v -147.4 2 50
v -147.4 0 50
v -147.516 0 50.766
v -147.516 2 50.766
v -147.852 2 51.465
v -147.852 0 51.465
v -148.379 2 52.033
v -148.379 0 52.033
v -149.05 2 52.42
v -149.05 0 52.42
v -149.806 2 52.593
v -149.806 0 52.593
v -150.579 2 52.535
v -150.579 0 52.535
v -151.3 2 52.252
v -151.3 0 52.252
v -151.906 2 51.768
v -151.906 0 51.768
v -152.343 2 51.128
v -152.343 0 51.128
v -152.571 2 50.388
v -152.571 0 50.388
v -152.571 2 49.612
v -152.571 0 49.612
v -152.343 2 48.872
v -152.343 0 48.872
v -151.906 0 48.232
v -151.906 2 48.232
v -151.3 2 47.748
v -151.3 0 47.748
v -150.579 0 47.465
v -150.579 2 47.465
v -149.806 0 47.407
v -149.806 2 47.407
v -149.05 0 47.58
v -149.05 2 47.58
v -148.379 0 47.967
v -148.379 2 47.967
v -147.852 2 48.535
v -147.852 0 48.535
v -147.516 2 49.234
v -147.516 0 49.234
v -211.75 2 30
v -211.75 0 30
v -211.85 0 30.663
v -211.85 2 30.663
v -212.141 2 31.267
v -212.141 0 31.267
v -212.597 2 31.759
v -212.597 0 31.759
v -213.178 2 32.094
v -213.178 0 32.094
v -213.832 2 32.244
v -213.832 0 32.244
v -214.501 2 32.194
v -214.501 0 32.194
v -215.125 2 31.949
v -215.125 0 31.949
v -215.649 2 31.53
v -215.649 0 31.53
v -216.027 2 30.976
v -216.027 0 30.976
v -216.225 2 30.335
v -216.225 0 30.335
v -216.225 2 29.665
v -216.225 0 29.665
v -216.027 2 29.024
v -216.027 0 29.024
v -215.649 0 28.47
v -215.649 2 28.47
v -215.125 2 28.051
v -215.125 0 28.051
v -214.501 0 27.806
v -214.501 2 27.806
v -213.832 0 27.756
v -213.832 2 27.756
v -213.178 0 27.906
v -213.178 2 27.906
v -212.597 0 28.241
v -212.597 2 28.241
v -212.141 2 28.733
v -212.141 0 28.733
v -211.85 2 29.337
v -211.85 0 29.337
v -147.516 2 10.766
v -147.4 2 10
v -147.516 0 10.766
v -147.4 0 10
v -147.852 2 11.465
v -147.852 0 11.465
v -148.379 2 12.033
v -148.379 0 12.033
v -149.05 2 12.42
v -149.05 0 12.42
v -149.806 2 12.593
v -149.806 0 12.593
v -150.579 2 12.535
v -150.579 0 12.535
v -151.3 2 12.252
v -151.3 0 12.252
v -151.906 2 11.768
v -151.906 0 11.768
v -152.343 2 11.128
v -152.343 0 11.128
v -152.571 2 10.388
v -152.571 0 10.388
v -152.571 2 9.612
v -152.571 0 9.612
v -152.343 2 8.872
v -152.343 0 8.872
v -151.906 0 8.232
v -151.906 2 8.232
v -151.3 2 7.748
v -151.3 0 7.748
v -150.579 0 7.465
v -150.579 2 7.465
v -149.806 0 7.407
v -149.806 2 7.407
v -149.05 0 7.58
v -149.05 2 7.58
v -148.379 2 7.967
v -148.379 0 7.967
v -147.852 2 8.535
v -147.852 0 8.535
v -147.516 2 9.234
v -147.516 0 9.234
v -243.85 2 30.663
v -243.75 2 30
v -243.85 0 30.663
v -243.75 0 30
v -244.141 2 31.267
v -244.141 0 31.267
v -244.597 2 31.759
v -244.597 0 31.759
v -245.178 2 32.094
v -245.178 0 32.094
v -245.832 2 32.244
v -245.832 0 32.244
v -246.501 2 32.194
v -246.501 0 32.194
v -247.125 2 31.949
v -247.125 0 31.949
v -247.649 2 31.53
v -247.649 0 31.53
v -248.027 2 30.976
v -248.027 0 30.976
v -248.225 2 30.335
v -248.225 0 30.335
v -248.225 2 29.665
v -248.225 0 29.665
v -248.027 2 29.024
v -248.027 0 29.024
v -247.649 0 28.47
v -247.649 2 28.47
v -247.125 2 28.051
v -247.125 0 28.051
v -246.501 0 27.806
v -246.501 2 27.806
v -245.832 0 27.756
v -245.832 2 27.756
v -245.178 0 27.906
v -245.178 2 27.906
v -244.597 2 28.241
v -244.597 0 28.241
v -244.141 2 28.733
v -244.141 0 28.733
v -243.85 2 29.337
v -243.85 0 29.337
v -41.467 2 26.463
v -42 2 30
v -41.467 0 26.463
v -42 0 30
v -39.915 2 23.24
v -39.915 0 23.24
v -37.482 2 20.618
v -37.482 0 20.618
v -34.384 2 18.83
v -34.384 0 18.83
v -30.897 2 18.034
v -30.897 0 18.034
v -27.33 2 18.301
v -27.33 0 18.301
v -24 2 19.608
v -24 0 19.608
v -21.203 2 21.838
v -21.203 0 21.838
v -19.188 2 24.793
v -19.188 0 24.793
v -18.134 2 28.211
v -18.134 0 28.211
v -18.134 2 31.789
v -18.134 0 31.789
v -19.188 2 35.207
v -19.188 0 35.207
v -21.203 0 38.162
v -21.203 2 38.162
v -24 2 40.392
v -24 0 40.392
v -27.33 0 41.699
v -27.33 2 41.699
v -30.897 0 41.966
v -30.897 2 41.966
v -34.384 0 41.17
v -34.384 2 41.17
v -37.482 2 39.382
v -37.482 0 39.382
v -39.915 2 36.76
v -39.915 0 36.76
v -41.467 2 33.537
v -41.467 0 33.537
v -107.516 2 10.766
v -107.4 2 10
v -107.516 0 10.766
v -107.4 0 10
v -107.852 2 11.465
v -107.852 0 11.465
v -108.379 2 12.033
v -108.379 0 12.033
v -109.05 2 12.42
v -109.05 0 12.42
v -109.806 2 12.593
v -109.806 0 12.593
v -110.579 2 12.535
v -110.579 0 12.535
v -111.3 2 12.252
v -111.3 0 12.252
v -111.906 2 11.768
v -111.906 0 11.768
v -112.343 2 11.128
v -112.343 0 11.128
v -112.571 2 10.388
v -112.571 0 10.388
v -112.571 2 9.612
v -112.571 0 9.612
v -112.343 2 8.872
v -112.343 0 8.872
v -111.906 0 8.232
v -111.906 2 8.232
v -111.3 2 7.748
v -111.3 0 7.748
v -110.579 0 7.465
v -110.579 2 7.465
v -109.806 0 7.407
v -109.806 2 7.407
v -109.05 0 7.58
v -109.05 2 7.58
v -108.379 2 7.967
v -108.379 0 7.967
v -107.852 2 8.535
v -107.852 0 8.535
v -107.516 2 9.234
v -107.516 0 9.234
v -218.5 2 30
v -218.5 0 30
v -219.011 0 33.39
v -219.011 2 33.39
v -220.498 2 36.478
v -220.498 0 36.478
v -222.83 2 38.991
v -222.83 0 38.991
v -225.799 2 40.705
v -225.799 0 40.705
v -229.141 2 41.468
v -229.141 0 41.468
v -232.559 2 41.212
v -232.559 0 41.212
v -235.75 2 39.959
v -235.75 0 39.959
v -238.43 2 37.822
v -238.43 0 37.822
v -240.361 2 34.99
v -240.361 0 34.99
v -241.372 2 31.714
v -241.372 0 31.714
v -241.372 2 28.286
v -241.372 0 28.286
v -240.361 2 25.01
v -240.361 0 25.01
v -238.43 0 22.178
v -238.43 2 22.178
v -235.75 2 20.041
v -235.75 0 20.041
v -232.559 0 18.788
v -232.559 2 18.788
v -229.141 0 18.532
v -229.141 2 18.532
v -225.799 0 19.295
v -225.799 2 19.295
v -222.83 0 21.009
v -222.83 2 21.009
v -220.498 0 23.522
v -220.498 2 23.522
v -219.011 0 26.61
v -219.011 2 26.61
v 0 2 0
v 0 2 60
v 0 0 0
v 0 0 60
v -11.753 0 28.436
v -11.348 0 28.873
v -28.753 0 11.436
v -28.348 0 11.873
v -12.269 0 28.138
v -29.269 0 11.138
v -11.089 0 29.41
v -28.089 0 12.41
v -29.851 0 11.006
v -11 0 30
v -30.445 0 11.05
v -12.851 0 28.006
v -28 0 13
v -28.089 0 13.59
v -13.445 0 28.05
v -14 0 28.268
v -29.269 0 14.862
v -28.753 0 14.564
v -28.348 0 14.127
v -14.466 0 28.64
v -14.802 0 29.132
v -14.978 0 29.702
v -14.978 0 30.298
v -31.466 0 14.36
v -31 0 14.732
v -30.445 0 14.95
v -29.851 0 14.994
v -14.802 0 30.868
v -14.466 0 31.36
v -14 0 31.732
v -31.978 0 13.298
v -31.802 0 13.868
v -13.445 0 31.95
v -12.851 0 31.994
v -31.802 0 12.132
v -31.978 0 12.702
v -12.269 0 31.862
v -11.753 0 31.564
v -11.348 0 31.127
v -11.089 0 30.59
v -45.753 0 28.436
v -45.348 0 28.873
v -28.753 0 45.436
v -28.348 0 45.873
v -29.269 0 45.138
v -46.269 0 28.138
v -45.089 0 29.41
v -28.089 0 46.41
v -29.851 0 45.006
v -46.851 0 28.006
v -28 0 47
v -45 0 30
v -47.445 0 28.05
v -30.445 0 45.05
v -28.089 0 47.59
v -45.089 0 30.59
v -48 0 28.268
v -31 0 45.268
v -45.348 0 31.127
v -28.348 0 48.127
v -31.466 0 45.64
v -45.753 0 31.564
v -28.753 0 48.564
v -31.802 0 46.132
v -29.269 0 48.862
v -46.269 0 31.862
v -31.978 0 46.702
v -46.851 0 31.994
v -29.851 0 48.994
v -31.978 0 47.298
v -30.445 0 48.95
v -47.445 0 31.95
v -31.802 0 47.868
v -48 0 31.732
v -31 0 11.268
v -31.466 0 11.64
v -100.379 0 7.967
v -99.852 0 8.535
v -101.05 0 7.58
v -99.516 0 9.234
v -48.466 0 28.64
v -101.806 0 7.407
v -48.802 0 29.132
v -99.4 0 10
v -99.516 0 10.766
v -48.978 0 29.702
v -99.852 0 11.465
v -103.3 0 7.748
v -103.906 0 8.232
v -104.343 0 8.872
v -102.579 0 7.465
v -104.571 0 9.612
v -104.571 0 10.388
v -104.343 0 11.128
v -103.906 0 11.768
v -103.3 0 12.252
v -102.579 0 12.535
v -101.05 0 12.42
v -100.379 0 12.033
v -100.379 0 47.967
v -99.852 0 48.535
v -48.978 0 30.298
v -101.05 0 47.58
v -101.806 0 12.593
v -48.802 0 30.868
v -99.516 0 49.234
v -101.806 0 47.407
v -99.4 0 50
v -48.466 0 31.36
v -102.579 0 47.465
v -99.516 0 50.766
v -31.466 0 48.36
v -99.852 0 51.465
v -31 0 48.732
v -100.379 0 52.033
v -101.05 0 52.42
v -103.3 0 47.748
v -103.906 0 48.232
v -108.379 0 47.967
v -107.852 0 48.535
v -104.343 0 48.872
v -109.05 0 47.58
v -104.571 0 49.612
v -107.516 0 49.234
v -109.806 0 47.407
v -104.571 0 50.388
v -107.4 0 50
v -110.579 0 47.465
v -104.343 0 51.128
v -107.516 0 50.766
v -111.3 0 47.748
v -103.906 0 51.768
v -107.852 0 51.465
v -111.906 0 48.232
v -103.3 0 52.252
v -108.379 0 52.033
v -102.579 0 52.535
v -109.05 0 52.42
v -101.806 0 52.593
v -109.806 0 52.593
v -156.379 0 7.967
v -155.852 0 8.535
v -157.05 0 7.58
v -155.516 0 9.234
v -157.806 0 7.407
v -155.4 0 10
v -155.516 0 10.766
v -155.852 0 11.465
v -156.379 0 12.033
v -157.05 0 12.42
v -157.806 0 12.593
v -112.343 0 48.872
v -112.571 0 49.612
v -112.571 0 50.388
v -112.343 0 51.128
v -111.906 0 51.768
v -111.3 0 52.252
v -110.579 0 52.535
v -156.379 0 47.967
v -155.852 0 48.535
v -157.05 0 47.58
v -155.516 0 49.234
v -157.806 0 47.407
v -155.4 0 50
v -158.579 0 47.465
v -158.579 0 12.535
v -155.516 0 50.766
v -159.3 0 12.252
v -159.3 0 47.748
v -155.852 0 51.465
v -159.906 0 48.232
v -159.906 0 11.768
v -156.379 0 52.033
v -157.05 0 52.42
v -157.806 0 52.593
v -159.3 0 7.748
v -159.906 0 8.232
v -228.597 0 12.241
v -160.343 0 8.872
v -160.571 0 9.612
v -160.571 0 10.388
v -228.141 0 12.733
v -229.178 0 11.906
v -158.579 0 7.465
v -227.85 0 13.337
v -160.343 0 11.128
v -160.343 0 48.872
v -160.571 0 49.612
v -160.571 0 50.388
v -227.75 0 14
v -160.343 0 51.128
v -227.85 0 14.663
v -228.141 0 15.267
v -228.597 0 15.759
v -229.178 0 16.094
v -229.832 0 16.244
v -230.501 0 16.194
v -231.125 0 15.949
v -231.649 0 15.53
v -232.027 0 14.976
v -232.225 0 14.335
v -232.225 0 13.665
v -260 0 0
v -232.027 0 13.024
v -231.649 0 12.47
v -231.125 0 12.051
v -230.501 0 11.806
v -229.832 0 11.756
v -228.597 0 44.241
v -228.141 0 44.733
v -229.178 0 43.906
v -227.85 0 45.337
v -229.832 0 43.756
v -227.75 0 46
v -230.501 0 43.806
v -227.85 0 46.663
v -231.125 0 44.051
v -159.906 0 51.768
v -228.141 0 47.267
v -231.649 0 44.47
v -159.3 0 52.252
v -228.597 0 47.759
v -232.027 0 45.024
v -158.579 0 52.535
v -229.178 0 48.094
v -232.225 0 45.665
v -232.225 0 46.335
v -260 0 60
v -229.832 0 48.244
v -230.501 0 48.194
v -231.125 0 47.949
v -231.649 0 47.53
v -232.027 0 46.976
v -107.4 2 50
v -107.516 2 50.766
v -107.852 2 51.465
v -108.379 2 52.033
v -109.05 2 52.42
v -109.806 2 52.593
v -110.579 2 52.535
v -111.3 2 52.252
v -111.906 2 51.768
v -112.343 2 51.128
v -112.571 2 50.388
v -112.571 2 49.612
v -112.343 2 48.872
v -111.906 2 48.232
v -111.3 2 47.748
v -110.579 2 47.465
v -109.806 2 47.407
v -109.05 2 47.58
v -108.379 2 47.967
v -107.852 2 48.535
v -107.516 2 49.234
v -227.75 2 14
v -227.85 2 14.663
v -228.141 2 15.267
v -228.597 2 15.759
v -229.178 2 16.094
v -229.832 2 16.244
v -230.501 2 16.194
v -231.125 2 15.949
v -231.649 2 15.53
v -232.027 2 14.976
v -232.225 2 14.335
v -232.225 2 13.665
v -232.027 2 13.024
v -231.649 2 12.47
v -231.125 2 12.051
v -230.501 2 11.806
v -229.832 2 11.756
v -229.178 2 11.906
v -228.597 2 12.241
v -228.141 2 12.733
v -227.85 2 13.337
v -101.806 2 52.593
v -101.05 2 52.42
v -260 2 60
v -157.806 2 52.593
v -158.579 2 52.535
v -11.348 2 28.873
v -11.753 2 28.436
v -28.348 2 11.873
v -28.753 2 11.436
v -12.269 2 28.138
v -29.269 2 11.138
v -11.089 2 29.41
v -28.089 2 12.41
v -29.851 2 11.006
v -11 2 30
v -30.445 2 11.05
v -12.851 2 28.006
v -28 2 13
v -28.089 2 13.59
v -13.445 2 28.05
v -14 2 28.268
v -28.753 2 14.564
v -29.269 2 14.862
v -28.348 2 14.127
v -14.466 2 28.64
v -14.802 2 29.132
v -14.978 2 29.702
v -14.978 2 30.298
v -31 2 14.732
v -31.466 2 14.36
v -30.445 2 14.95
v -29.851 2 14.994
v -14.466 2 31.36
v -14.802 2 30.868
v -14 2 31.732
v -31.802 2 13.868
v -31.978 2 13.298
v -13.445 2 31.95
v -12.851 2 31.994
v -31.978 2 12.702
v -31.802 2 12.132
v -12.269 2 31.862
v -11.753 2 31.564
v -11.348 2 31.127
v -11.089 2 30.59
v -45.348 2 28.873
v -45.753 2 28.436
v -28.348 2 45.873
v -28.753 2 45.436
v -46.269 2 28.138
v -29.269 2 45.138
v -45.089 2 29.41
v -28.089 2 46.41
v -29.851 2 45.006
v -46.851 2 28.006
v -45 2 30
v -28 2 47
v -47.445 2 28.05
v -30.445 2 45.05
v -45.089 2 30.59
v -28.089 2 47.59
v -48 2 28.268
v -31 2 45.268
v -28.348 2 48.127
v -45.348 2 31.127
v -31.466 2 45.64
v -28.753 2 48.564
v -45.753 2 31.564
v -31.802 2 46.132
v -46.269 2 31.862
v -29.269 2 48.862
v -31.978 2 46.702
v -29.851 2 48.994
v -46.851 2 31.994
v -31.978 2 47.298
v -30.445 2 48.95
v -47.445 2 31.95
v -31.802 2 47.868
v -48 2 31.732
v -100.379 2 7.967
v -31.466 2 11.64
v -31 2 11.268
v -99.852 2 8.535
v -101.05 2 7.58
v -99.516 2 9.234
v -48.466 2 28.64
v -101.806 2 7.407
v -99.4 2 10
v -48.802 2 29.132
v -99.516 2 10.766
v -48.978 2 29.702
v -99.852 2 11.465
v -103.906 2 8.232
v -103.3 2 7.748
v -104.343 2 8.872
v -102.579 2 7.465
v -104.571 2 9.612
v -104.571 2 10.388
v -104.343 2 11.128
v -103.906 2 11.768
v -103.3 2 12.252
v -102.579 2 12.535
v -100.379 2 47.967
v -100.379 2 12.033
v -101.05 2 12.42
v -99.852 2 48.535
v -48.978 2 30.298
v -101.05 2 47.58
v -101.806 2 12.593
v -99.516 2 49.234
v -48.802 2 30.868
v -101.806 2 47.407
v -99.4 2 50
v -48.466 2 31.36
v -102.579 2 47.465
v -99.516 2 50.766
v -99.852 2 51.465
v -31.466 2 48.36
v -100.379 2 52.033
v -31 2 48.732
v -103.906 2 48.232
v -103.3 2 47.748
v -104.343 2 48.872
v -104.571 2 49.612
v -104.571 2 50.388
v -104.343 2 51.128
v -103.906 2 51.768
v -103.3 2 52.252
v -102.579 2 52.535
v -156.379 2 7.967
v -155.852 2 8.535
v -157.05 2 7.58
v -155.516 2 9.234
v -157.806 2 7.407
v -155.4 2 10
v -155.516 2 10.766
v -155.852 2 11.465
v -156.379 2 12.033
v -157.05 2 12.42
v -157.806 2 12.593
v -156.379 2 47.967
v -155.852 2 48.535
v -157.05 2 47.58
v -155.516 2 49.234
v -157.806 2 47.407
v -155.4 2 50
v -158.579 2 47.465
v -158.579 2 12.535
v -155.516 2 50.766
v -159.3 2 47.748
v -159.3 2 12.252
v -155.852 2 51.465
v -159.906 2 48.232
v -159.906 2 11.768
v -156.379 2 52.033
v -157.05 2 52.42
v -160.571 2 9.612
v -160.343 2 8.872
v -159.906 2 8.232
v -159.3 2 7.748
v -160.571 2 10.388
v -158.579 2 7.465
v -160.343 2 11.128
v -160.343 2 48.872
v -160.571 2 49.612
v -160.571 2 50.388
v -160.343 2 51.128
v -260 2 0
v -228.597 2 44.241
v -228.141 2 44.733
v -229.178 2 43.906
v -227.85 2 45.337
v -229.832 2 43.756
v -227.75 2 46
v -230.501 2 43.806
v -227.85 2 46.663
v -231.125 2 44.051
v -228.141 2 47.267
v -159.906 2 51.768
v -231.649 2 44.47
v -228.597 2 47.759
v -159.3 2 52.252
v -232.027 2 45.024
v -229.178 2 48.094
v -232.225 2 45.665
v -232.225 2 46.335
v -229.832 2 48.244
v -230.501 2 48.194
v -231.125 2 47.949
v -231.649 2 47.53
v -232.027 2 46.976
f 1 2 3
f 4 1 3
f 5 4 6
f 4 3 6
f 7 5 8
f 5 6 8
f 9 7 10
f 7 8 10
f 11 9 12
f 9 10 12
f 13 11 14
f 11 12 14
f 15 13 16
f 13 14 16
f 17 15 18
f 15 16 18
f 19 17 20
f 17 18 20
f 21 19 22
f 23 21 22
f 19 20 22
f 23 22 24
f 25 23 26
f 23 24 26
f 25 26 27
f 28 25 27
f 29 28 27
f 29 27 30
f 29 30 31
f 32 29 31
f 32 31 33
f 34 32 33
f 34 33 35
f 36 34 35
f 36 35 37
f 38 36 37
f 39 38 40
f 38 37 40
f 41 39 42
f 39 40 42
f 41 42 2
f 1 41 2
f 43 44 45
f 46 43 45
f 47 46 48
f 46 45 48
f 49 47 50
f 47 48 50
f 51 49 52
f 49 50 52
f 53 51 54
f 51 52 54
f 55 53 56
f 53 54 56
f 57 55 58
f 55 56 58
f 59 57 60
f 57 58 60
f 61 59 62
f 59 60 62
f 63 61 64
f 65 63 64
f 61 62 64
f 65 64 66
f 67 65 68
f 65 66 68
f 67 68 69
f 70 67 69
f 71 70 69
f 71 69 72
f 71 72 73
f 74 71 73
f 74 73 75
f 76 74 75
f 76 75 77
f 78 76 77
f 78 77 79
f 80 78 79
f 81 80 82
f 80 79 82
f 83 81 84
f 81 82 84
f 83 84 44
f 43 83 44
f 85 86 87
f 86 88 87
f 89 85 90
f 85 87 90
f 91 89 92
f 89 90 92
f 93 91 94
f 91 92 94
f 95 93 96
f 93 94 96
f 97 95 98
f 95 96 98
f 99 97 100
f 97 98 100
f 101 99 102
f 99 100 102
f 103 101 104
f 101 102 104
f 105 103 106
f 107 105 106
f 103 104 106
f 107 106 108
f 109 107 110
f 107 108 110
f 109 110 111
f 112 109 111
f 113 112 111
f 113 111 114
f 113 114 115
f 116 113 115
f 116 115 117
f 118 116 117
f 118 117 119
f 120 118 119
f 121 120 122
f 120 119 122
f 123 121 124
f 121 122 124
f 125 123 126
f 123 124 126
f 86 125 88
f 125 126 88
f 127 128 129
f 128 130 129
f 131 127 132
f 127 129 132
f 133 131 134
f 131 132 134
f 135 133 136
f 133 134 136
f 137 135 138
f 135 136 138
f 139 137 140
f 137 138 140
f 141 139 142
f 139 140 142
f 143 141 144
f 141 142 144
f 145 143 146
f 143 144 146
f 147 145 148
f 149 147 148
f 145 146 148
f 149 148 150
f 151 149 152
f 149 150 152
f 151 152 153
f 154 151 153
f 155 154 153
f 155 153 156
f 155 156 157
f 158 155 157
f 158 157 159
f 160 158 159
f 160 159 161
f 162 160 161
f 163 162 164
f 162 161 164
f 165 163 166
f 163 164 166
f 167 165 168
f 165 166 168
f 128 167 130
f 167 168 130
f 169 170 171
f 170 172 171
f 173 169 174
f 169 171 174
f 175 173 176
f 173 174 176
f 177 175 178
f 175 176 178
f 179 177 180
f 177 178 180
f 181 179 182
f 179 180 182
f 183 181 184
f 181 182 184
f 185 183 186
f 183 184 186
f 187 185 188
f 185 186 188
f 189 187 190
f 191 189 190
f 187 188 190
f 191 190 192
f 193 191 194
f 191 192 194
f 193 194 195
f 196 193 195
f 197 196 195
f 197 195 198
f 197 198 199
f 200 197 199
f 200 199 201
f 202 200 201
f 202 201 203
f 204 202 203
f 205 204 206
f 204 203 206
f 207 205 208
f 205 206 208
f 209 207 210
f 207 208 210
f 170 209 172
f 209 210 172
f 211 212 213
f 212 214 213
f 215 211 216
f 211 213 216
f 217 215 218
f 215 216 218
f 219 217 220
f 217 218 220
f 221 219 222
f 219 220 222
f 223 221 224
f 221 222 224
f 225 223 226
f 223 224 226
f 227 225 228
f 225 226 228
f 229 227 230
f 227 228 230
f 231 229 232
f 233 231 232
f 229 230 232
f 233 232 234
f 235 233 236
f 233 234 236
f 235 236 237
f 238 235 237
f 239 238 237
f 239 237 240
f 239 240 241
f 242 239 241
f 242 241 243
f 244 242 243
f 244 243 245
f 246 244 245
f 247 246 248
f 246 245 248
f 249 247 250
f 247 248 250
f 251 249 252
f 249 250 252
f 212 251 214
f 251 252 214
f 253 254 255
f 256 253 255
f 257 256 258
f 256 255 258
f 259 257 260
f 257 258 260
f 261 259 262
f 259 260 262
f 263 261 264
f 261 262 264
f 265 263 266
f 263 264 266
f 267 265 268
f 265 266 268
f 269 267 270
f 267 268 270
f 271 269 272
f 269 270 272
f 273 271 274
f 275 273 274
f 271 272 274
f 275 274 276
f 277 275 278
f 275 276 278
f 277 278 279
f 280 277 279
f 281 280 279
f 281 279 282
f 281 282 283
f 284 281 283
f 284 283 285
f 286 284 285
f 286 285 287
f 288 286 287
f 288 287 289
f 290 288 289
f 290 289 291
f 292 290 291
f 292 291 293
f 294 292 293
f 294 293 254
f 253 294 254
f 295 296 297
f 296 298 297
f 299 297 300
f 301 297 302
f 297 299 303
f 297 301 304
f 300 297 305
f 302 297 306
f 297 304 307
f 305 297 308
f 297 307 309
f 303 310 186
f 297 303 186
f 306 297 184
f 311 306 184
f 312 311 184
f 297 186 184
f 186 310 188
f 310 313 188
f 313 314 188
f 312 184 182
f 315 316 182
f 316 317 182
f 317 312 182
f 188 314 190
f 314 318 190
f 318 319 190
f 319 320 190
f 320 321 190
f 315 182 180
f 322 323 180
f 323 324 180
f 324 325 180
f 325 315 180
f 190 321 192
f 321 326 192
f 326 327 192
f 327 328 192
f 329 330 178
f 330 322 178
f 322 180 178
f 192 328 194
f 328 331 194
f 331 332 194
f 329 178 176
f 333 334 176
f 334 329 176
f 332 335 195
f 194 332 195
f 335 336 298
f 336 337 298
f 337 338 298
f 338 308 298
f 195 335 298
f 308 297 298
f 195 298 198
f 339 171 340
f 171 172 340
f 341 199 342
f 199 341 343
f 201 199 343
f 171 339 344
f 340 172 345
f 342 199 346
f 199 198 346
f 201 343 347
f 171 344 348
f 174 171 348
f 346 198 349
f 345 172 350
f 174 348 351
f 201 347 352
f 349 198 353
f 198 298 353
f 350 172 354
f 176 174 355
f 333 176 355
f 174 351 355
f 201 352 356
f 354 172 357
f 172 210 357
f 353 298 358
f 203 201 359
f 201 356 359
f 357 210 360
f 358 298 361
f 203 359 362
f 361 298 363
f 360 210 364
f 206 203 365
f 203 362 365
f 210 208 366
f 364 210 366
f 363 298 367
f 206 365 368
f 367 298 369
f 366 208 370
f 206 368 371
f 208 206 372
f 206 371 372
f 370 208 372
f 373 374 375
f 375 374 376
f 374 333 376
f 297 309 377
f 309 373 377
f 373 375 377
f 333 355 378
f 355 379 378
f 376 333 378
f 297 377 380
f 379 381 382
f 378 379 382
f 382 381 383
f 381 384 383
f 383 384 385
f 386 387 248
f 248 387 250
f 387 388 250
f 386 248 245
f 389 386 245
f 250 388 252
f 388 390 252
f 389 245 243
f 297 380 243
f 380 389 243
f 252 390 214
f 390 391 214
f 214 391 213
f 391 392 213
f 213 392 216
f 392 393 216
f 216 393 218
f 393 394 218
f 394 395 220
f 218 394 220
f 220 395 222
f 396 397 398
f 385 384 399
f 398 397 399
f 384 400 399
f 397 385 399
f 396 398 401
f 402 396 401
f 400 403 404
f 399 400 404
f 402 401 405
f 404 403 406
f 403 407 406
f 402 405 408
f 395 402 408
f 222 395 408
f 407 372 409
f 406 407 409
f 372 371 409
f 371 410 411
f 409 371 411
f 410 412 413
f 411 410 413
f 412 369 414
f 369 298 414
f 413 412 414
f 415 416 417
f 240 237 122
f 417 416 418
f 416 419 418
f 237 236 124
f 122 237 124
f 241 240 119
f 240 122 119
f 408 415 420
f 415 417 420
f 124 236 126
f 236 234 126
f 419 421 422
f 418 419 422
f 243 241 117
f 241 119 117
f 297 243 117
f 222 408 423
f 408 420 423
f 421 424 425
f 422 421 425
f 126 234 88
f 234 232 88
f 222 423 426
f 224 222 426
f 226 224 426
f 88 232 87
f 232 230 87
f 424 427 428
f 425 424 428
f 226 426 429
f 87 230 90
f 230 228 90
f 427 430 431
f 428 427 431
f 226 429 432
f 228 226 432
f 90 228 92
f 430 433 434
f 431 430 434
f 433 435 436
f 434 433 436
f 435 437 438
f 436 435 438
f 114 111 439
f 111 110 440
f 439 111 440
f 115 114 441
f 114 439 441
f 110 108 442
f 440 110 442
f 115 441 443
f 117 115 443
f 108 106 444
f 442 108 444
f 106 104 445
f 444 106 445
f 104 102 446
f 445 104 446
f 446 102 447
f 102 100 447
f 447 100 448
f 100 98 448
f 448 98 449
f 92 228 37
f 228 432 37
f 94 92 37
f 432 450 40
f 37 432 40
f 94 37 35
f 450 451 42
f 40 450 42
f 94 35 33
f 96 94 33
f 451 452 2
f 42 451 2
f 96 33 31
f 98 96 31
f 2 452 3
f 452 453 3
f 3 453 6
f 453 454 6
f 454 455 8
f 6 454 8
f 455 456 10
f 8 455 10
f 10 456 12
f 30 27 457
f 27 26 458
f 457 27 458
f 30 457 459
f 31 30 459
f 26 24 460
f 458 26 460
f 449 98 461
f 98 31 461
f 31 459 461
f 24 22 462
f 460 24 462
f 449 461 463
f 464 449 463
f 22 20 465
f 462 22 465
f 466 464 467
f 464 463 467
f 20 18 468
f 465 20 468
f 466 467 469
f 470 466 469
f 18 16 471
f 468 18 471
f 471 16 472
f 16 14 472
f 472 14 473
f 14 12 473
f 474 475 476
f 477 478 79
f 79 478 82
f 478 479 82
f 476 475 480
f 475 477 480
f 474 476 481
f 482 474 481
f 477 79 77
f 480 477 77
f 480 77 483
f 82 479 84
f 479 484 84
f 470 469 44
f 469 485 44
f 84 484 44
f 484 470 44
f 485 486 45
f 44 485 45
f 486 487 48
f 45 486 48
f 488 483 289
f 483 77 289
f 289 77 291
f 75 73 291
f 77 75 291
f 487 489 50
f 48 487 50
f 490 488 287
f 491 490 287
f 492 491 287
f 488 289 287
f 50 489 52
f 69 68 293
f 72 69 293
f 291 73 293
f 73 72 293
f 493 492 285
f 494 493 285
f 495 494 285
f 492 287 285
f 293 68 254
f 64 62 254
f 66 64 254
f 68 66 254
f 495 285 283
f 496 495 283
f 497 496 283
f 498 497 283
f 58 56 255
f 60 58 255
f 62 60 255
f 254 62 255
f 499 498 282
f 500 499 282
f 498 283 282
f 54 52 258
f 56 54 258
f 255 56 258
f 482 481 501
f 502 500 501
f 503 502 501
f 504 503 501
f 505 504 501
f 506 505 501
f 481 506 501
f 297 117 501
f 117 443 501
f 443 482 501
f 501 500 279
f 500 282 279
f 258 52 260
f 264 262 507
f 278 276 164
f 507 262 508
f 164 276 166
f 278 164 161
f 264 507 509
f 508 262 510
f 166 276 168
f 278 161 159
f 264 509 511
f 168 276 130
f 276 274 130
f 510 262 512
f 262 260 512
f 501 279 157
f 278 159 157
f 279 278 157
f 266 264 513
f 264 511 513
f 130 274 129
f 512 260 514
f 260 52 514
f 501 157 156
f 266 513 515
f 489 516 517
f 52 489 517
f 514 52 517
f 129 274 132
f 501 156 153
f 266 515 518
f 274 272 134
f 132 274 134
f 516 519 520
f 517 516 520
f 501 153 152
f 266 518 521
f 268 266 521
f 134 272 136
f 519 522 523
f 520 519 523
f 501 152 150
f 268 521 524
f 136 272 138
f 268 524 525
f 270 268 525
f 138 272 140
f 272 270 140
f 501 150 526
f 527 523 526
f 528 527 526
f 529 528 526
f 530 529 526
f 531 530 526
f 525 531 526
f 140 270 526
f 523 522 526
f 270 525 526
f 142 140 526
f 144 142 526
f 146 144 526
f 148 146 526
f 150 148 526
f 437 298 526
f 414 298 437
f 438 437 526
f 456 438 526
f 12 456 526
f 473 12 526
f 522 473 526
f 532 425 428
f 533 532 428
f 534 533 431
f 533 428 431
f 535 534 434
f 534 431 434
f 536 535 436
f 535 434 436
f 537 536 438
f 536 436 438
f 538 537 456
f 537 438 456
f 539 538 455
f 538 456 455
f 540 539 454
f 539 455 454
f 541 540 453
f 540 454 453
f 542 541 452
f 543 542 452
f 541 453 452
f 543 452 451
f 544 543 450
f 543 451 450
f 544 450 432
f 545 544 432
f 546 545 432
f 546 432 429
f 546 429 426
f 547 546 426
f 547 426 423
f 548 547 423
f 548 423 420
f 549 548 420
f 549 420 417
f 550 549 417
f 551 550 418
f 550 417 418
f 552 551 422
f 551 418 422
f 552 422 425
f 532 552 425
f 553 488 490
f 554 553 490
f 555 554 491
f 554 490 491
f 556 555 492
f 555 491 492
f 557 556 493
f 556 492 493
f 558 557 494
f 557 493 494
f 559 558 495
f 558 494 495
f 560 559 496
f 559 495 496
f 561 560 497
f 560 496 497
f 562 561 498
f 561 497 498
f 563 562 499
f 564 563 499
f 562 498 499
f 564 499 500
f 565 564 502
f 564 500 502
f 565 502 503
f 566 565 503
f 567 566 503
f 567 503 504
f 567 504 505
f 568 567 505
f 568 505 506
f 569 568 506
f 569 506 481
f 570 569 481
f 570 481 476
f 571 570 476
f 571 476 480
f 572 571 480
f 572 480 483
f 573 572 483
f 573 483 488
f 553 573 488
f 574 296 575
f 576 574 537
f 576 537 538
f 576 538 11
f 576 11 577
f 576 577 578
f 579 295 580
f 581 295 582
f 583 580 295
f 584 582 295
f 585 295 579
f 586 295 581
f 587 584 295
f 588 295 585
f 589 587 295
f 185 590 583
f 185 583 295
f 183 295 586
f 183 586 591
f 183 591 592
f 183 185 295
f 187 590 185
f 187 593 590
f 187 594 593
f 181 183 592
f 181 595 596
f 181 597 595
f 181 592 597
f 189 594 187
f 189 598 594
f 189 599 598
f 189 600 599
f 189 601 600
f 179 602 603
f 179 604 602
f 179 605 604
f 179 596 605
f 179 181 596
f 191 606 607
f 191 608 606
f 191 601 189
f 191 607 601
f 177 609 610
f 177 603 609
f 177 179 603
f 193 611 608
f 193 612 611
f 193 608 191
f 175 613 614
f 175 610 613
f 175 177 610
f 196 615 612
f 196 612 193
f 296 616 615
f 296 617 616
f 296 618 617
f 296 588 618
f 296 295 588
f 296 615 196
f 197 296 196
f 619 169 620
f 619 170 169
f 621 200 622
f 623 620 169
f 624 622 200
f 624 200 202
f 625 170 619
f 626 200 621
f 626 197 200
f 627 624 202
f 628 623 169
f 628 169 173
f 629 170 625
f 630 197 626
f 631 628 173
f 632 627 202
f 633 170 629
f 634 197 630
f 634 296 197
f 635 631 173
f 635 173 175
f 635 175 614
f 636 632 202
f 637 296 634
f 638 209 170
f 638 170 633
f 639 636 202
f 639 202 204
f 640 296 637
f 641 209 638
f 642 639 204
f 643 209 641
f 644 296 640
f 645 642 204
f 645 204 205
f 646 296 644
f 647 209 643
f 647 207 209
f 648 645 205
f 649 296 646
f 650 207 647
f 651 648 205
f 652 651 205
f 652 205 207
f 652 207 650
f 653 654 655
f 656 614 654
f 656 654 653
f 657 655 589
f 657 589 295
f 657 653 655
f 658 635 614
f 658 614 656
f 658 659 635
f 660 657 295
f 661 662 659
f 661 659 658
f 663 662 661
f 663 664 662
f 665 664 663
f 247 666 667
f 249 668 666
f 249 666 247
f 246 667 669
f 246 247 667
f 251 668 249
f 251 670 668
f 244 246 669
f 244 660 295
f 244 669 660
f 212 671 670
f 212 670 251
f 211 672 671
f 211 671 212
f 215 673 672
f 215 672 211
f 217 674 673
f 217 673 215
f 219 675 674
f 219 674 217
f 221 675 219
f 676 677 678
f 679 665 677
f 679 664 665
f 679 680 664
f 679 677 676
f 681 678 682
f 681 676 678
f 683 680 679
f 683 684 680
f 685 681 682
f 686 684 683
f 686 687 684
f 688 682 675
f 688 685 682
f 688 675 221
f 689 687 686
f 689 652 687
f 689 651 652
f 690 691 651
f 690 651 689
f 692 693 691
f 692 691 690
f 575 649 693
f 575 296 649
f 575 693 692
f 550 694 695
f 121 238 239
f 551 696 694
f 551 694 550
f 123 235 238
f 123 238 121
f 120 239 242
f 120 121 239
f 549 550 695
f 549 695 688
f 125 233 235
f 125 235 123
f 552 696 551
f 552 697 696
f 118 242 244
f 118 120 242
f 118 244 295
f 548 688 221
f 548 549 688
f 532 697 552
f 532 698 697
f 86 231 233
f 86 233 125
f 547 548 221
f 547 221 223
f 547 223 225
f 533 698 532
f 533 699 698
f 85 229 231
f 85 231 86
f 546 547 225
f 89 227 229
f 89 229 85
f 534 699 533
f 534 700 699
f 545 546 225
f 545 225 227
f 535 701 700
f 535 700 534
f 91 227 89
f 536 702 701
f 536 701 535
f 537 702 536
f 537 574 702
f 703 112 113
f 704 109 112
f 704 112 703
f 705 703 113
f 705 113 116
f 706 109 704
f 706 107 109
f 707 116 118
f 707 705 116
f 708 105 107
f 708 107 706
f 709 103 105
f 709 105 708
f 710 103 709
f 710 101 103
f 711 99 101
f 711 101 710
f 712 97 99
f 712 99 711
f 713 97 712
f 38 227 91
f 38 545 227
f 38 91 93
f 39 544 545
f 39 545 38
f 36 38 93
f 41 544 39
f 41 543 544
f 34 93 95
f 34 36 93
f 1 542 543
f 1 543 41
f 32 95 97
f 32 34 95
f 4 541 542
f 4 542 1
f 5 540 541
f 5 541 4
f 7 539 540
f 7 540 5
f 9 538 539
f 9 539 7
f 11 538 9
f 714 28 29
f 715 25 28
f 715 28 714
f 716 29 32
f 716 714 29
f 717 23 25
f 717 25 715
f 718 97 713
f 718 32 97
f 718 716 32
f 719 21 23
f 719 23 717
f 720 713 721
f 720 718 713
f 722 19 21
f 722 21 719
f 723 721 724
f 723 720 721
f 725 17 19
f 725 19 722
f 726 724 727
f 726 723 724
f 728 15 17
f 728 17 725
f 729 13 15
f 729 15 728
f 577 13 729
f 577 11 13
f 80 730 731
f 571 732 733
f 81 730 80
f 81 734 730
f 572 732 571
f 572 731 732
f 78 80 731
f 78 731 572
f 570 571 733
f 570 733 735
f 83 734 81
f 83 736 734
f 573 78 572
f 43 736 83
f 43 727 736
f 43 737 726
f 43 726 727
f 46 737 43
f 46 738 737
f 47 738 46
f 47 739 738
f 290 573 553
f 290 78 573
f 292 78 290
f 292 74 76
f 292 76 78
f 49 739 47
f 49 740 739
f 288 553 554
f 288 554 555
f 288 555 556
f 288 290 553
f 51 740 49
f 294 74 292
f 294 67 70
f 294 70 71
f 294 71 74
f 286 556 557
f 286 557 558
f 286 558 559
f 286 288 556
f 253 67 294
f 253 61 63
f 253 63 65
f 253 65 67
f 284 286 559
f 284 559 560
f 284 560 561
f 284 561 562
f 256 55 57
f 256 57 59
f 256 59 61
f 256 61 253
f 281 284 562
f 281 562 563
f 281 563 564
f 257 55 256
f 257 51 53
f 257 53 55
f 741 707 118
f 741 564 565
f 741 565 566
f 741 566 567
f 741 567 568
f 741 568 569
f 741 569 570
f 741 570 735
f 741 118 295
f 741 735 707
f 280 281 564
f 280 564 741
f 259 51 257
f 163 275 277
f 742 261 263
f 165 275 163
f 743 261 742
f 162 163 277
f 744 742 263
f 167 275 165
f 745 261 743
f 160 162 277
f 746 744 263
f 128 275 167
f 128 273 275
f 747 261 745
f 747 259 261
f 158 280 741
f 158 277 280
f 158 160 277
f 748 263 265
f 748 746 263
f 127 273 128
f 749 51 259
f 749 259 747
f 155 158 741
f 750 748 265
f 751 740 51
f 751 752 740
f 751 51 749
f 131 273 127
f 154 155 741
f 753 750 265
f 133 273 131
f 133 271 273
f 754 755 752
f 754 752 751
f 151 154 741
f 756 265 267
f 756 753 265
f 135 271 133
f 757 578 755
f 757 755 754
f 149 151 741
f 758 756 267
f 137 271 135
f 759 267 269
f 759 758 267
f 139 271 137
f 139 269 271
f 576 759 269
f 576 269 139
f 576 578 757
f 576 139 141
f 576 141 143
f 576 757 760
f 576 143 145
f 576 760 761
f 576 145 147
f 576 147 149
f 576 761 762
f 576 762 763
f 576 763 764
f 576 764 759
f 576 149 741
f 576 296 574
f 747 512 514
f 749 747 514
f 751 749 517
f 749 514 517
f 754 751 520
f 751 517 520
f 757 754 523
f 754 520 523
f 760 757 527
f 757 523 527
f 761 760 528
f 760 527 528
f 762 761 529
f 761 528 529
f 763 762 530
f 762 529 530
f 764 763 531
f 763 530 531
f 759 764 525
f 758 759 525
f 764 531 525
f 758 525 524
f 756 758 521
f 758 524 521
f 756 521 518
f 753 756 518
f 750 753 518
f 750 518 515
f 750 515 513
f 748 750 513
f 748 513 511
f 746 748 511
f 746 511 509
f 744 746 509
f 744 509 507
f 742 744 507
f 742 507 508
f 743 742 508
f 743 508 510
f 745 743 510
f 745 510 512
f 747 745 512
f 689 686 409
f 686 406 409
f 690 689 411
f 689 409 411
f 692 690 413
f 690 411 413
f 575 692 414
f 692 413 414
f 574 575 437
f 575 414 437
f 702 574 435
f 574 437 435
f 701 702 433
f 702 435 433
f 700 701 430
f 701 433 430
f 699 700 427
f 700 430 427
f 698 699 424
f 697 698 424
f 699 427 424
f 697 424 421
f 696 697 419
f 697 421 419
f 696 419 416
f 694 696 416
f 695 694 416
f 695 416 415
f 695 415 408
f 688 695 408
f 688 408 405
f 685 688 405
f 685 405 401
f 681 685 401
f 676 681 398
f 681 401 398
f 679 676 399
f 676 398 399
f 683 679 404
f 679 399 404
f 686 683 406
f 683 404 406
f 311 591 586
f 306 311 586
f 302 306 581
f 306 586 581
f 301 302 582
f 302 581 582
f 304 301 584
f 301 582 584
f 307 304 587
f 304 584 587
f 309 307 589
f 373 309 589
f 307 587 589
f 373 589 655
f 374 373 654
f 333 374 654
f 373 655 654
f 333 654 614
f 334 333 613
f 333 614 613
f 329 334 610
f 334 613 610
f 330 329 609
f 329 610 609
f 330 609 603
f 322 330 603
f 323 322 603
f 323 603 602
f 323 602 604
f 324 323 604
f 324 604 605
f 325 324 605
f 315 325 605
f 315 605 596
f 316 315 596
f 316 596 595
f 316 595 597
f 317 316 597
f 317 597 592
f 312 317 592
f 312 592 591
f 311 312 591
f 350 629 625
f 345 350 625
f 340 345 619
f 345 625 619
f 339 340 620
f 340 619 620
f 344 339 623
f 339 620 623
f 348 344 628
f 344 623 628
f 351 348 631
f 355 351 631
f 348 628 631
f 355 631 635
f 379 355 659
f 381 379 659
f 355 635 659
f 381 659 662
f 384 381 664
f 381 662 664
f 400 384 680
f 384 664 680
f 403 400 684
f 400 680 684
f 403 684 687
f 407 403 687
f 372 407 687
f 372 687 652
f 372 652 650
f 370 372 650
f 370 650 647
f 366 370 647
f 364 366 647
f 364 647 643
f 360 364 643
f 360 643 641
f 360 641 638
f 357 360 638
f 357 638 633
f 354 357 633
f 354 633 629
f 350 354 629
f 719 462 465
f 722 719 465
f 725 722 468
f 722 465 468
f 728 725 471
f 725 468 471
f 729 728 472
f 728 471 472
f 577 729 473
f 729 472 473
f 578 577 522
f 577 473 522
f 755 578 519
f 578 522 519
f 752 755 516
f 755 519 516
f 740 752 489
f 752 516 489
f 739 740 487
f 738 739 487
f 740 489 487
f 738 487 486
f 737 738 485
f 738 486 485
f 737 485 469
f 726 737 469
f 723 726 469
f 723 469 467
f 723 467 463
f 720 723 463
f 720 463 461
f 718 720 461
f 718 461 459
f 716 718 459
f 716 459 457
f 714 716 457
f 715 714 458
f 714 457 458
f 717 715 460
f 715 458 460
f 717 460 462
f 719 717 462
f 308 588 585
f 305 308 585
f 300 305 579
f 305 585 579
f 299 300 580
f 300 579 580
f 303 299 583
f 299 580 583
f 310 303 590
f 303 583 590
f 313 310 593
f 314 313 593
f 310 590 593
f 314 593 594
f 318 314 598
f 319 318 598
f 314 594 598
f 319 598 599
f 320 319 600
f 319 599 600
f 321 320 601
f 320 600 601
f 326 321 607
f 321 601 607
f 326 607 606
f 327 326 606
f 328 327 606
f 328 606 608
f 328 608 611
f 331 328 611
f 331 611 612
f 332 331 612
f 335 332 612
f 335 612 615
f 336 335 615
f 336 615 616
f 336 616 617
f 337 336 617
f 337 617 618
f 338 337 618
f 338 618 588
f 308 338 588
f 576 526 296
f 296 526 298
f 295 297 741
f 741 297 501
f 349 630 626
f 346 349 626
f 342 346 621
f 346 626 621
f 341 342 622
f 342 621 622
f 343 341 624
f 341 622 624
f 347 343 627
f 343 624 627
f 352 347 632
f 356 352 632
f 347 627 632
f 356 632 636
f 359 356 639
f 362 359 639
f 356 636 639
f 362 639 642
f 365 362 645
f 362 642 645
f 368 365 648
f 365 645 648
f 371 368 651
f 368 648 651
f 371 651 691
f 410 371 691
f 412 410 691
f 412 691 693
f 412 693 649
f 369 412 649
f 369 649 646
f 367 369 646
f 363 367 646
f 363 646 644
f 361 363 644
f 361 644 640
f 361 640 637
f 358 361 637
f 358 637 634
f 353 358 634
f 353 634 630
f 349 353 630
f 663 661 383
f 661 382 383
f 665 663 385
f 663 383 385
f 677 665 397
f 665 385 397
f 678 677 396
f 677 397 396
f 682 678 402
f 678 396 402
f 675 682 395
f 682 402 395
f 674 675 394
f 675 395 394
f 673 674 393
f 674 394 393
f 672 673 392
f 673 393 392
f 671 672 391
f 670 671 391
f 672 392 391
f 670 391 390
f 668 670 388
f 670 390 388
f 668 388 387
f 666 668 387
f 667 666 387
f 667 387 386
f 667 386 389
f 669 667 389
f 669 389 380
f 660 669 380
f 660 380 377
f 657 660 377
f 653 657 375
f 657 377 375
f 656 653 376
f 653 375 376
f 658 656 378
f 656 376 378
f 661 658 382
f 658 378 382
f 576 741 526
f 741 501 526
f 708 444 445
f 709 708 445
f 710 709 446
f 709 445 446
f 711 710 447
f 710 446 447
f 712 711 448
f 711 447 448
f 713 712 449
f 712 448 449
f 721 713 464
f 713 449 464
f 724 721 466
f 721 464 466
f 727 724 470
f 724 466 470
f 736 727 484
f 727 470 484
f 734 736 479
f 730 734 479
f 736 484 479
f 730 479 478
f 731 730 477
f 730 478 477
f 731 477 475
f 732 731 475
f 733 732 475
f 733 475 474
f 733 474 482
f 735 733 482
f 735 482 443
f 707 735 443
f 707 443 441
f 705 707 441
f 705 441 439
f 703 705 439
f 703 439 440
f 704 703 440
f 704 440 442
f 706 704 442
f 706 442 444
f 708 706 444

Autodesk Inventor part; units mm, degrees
ref_plane "YZ Plane" through (0, 0, 0) normal (1, 0, 0) x (0, 1, 0)
ref_plane "XZ Plane" through (0, 0, 0) normal (0, 1, 0) x (-1, 0, 0)
ref_plane "XY Plane" through (0, 0, 0) normal (0, 0, 1) x (1, 0, 0)
sketch "スケッチ1" plane through (0, 0, 0) normal (0, 1, 0) x (-1, 0, 0)
  line L0 (0, 0) -> (260, 0)
  line L1 (260, 0) -> (260, 60)
  line L2 (260, 60) -> (0, 60)
  line L3 (0, 60) -> (0, 0)
  dimension "d0" = 260
  dimension "d1" = 60
extrude "押し出し1" add sketch "スケッチ1" along normal blind 2
sketch "スケッチ2" plane through (0, 0, 0) normal (0, 1, 0) x (-1, 0, 0)
  circle A0 centre (30, 30) radius 12
  line L0 (0, 60) -> (0, 0) projected
  line L1 (0, 0) -> (260, 0) projected
  dimension "d4" = 24
  dimension "d5" = 30
  dimension "d6" = 30
extrude "押し出し2" cut sketch "スケッチ2" along normal blind 10
sketch "スケッチ3" plane through (0, 2, 0) normal (0, 1, 0) x (1, 0, 0)
  circle A0 centre (-30, -30) radius 12 projected
  circle A1 centre (-30, -13) radius 2
  circle A2 centre (-13, -30) radius 2
  circle A3 centre (-47, -30) radius 2
  circle A4 centre (-30, -47) radius 2
  point P0 (0, 0)
  dimension "d10" = 4
  dimension "d11" = 4
  dimension "d12" = 4
  dimension "d13" = 4
extrude "押し出し3" cut sketch "スケッチ3" against normal blind 10 contours A1 | A2 | A3 | A4
sketch "スケッチ4" plane through (0, 0, 0) normal (0, -1, 0) x (1, 0, 0)
  circle A0 centre (-230, 30) radius 11.5
  line L0 (-260, 0) -> (-260, 60) projected
  point P0 (0, 0)
  dimension "d16" = 23
  dimension "d26" = 30
extrude "押し出し4" cut sketch "スケッチ4" against normal blind 10
sketch "スケッチ5" plane through (0, 0, 0) normal (0, -1, 0) x (1, 0, 0)
  circle A0 centre (-230, 30) radius 11.5 projected
  circle A1 centre (-246, 30) radius 2.25
  circle A2 centre (-230, 46) radius 2.25
  circle A3 centre (-214, 30) radius 2.25
  circle A4 centre (-230, 14) radius 2.25
  point P0 (0, 0)
  dimension "d28" = 4.5
  dimension "d29" = 4.5
  dimension "d30" = 4.5
  dimension "d31" = 4.5
extrude "押し出し6" cut sketch "スケッチ5" against normal blind 10 contours A1 | A2 | A3 | A4
sketch "スケッチ6" plane through (0, 0, 0) normal (0, -1, 0) x (1, 0, 0)
  circle A0 centre (-158, 10) radius 2.6
  line L0 (0, 0) -> (-260, 0) projected
  circle A1 centre (-150, 10) radius 2.6
  circle A2 centre (-110, 10) radius 2.6
  circle A3 centre (-102, 10) radius 2.6
  circle A4 centre (-158, 50) radius 2.6
  line L1 (-260, 60) -> (0, 60) projected
  circle A5 centre (-150, 50) radius 2.6
  circle A6 centre (-110, 50) radius 2.6
  circle A7 centre (-102, 50) radius 2.6
  line L2 (-260, 0) -> (-260, 60) projected
  dimension "d34" = 5.2
  dimension "d35" = 10
  dimension "d36" = 5.2
  dimension "d37" = 8
  dimension "d38" = 5.2
  dimension "d39" = 40
  dimension "d40" = 5.2
  dimension "d41" = 8
  dimension "d42" = 5.2
  dimension "d43" = 10
  dimension "d44" = 5.2
  dimension "d45" = 5.2
  dimension "d46" = 5.2
  dimension "d49" = 102
  dimension "d50" = 40
  dimension "d51" = 8
  dimension "d52" = 8
  dimension "d53" = 102
extrude "押し出し7" cut sketch "スケッチ6" against normal blind 10
properties part number "UpperArm1" material "アルミニウム 6061"
